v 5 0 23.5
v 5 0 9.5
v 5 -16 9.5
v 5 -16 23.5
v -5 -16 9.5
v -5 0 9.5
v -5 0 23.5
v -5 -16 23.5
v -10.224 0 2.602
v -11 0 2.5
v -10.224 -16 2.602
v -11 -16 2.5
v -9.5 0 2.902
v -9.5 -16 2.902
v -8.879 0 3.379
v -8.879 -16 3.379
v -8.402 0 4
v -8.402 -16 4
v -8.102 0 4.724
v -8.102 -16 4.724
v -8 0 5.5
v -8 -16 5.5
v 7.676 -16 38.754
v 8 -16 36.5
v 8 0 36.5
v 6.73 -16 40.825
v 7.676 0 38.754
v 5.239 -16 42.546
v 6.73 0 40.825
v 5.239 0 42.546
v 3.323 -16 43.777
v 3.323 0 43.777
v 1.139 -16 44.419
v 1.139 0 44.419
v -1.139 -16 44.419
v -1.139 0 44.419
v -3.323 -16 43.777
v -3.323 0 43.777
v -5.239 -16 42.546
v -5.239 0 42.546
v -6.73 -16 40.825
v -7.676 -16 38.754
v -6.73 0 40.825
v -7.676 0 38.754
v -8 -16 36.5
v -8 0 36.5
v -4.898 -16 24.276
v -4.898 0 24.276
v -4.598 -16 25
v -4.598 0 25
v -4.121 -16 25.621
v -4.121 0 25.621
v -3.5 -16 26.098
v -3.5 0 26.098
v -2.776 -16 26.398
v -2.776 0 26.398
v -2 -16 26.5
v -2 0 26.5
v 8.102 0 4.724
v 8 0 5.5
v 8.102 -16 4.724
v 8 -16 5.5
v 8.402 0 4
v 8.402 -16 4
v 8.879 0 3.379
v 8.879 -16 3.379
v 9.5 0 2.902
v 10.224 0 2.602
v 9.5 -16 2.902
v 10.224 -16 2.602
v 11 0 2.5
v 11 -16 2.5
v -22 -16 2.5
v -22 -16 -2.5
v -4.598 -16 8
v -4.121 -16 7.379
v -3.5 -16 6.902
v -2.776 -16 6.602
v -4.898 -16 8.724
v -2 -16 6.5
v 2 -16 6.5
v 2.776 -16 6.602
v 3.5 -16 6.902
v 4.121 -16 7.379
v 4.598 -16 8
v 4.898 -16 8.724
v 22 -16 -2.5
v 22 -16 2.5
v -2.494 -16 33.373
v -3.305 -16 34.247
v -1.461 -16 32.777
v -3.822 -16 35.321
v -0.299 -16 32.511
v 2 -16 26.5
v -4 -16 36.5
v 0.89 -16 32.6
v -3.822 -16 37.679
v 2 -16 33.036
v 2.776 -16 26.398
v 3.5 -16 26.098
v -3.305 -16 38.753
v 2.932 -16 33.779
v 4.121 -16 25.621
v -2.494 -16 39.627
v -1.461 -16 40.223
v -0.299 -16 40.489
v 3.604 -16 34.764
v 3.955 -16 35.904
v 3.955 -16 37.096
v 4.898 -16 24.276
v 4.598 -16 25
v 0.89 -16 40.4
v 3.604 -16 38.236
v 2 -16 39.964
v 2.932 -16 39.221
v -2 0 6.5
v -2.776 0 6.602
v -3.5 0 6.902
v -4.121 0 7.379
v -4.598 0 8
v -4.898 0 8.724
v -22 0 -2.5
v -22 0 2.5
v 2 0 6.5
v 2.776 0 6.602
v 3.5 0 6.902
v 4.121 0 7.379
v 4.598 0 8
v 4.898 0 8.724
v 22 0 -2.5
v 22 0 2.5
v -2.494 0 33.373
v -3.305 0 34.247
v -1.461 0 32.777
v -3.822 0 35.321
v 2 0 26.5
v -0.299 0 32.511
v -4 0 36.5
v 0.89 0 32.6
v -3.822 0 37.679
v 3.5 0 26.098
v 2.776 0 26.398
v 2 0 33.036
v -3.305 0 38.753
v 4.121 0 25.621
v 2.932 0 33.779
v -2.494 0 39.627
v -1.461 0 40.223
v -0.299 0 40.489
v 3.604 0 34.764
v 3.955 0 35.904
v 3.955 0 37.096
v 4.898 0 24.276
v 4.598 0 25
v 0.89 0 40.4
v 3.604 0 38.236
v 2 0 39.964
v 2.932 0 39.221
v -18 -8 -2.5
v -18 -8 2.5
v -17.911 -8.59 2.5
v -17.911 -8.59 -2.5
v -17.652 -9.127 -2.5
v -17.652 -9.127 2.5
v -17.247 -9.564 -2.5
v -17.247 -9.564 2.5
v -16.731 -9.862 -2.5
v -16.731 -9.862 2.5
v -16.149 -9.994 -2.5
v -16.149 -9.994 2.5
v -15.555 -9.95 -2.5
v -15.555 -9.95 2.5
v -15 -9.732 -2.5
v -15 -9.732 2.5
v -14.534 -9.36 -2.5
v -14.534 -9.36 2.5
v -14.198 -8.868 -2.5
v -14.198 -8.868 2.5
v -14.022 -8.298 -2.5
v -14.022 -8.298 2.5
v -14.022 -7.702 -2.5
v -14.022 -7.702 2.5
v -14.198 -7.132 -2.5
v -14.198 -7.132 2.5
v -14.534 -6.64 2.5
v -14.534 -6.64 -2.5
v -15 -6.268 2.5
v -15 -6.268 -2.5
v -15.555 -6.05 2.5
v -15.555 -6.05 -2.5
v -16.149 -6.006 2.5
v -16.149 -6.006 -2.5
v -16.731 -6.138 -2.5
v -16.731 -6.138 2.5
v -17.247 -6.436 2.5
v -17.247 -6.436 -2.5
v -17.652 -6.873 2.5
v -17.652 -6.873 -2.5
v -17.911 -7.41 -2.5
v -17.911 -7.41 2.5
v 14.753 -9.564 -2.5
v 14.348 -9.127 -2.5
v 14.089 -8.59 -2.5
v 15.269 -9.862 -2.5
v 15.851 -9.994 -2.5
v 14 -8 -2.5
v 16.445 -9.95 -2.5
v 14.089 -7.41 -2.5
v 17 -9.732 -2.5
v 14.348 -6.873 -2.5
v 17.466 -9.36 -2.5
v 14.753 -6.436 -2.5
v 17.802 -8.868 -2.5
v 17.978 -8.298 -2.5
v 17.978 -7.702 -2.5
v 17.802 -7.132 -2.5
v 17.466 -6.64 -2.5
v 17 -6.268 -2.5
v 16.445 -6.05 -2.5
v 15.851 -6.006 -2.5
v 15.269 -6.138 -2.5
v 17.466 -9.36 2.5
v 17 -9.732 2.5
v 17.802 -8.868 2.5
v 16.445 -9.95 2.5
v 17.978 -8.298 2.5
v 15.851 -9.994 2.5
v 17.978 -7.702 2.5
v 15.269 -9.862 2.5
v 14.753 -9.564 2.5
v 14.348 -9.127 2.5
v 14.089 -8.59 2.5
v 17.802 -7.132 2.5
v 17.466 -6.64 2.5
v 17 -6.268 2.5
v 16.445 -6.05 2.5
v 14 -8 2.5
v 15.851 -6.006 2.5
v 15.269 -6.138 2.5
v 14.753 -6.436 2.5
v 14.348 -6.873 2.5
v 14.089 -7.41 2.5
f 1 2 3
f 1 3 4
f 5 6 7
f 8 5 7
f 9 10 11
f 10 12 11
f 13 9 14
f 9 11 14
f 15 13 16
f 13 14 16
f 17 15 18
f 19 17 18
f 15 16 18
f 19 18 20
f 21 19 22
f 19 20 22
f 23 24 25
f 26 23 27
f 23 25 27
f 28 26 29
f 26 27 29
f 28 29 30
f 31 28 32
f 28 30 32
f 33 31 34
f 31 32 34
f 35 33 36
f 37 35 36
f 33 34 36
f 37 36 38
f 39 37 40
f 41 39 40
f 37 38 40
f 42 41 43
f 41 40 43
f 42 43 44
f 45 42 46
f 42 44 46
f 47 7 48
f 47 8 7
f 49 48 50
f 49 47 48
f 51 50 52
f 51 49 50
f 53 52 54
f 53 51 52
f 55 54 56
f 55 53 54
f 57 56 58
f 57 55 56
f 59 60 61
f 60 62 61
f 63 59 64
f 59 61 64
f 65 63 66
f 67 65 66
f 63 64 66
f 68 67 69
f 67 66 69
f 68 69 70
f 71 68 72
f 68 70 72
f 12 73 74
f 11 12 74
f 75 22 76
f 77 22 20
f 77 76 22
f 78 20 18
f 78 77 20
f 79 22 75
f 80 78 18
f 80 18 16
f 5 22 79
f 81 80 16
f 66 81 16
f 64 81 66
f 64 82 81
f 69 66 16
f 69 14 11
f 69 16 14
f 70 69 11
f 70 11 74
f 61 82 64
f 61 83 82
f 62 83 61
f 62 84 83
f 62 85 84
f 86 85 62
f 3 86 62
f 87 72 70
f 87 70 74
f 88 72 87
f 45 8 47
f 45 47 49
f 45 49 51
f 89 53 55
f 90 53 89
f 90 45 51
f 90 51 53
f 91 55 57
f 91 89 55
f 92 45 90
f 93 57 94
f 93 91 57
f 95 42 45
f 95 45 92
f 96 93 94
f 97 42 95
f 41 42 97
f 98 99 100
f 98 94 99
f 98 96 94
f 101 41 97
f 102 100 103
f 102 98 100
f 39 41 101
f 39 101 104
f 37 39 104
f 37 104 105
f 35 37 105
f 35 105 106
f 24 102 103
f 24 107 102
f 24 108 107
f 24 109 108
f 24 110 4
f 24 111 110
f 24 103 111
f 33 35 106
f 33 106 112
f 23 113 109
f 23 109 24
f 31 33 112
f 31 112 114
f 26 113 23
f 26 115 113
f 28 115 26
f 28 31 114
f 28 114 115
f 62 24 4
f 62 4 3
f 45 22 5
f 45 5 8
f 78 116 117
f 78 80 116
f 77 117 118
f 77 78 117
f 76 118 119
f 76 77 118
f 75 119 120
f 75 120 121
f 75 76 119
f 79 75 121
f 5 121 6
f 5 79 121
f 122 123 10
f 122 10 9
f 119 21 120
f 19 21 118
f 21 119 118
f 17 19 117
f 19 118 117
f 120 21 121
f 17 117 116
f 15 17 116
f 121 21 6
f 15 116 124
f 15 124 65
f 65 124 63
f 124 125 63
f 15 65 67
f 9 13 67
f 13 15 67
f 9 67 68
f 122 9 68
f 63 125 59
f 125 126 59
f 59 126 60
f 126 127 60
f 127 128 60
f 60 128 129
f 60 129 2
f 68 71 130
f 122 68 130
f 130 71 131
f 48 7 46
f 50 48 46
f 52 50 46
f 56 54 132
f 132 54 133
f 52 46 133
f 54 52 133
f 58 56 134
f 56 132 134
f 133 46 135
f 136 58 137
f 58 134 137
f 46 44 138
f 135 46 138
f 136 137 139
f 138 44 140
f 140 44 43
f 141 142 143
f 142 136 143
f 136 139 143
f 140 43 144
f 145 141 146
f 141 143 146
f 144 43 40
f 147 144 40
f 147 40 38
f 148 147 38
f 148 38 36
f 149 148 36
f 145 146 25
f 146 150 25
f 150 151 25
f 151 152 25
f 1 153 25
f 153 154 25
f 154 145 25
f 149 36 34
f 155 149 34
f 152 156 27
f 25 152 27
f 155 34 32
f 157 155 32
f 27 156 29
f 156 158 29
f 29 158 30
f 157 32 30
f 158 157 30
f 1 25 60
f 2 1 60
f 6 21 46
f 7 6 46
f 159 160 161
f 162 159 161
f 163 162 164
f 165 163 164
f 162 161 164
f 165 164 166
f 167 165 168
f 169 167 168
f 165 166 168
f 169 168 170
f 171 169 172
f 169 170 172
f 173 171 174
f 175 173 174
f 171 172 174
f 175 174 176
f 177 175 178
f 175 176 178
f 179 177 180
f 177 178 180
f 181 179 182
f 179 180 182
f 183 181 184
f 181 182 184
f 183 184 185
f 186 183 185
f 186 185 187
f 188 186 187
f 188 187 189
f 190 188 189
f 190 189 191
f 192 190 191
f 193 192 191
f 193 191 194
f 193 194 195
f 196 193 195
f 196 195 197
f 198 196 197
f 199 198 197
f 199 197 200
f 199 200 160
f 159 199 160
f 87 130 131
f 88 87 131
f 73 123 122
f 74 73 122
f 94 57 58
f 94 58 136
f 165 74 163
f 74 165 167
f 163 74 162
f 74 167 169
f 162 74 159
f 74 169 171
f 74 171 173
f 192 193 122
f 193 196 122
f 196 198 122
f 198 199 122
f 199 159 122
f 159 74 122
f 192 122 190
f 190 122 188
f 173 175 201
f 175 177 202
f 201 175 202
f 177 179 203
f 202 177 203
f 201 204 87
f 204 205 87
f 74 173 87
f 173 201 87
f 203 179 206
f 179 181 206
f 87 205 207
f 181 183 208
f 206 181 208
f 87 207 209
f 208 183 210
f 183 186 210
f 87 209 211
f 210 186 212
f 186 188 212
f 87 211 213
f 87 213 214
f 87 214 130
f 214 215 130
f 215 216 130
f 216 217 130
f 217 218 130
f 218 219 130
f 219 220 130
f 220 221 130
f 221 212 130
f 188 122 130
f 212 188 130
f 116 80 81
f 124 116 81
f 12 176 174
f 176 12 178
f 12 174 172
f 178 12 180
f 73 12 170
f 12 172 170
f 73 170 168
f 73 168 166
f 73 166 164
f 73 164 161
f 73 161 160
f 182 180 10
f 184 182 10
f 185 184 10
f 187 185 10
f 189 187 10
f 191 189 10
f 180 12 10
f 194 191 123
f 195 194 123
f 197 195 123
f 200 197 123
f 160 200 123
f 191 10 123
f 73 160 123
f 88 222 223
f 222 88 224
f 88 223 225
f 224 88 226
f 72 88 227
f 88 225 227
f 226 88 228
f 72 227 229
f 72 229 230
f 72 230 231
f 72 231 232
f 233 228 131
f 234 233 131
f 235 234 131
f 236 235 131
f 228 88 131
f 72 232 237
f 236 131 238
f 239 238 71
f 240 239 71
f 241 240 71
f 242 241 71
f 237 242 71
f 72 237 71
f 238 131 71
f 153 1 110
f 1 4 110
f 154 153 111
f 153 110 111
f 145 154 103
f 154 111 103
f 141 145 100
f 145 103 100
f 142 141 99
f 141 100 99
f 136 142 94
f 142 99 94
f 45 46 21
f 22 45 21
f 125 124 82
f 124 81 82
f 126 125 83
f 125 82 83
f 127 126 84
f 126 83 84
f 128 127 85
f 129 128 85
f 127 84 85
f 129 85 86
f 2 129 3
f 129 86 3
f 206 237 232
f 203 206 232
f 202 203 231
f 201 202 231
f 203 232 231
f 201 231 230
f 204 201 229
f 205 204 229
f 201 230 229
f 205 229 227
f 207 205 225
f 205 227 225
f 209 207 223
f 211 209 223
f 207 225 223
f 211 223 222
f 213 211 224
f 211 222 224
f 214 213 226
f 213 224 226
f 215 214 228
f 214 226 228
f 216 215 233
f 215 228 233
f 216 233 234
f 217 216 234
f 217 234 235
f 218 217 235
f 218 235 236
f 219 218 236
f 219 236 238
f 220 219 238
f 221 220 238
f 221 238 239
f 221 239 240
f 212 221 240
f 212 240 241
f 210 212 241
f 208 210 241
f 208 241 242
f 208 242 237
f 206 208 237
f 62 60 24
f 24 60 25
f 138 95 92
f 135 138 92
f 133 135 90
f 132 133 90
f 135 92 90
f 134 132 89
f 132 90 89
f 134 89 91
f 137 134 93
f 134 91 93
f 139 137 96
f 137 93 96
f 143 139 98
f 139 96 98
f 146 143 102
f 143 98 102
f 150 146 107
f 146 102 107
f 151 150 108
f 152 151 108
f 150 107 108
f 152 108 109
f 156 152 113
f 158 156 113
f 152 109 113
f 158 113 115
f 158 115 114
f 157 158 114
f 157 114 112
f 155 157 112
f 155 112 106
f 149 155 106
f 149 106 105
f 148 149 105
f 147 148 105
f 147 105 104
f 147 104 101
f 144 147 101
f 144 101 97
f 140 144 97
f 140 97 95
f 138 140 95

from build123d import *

# Parameters (mm, degrees)
F0_W     = 10
F0_H     = 20
F1_DEPTH = 16
F2_D     = 8
F4_D     = 4
F5_R     = 3


with BuildPart() as f1:
    # F0 (on Front) → F1 (new body)
    with BuildSketch(Plane.XZ):
        with BuildLine():
            Line((-8, 2.5), (-22, 2.5))
            Line((-22, 2.5), (-22, -2.5))
            Line((-22, -2.5), (22, -2.5))
            Line((22, -2.5), (22, 2.5))
            Line((22, 2.5), (8, 2.5))
            Line((8, 2.5), (8, 36.5))
            ThreePointArc((8, 36.5), (0, 44.5), (-8, 36.5))
            Line((-8, 36.5), (-8, 2.5))
        make_face()
        with Locations((0, 16.5)):
            Rectangle(F0_W, F0_H, mode=Mode.SUBTRACT)
    extrude(amount=F1_DEPTH)

    # F2 (through all)
    with Locations(Plane(origin=(0, 0, 0), x_dir=(1, 0, 0), z_dir=(0, 1, 0))):
        with Locations((0, -36.5)):
            Hole(F2_D / 2)

    # F4 (through all)
    with Locations(Plane(origin=(0, 0, -2.5), x_dir=(1, 0, 0), z_dir=(0, 0, -1))):
        with Locations((-16, 8), (16, 8)):
            Hole(F4_D / 2)

    # F5
    f5_edges = [f1.edges().sort_by_distance(p)[0] for p in [
        (-8, -8, 2.5),
        (8, -8, 2.5),
        (5, -8, 6.5),
        (-5, -8, 6.5),
        (-5, -8, 26.5),
        (5, -8, 26.5),
    ]]
    fillet(f5_edges, radius=F5_R)


solid = f1.part
